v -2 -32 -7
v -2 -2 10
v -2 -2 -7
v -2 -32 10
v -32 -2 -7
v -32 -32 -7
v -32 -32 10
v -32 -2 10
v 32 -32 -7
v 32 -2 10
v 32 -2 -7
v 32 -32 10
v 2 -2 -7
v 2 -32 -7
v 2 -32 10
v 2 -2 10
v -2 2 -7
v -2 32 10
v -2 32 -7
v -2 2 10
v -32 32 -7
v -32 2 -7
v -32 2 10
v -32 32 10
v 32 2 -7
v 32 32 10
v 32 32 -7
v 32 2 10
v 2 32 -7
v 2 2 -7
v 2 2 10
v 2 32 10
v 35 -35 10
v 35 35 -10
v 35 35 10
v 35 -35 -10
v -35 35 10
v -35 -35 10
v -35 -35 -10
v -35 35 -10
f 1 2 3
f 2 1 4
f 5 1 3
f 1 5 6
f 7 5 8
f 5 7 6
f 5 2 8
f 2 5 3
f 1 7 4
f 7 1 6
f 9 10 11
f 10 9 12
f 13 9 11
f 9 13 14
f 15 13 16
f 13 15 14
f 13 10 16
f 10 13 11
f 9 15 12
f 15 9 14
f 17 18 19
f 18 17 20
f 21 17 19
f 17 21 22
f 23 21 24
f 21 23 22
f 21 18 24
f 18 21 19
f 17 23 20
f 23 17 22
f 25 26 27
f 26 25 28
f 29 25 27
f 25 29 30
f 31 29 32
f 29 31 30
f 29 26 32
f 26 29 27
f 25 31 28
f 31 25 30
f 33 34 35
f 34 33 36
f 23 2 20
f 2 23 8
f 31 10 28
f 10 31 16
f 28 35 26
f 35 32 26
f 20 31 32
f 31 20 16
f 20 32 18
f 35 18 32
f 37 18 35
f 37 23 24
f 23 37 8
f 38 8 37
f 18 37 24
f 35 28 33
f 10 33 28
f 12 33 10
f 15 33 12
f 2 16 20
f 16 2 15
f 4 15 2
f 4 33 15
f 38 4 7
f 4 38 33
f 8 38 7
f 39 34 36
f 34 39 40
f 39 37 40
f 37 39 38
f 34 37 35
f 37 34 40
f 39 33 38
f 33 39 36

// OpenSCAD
$fn = 32;

// ----------------------------------------------------------------------
// Pocket plate 70 x 70 x 20
// 2 x 2 pockets 30 mm square, 17 mm deep
// ----------------------------------------------------------------------

// --- parameters (mm) ---
thickness = 20;  // plate thickness
floor_t = 3;     // material left under each pocket
pocket = 30;     // pocket side length
pitch_x = 34;    // pocket pitch along X
pitch_y = 34;    // pocket pitch along Y
cols = 2;        // pockets per row
rows = 2;        // rows of pockets

// --- derived feature positions (mm) ---
depth = thickness - floor_t;        // = 17   pocket depth, down to the floor
span_x = (cols - 1) * pitch_x;      // = 34   distance between outer pockets
span_y = (rows - 1) * pitch_y;      // = 34   distance between outer pocket rows
origin_x = -span_x / 2;             // = -17   X of the first pocket
origin_y = -span_y / 2;             // = -17   Y of the first pocket
plate = [span_x + pocket + 6, span_y + pocket + 6, thickness];  // = [70, 70, 20]   overall size: pockets plus 3 mm of wall on each side
feature_centers = [
  [origin_x + 0 * pitch_x, origin_y + 0 * pitch_y],
  [origin_x + 1 * pitch_x, origin_y + 0 * pitch_y],
  [origin_x + 0 * pitch_x, origin_y + 1 * pitch_y],
  [origin_x + 1 * pitch_x, origin_y + 1 * pitch_y]
];   // pocket centres, used verbatim by the cutter loop

// plate outline, then one pocket per centre in feature_centers
difference() {
  cube(plate, center = true);
  for (centre = feature_centers)
    translate([centre[0] - pocket / 2, centre[1] - pocket / 2, plate[2] / 2 - depth])
      cube([pocket, pocket, depth + 1]);  // centred on the declared pocket centre
}
